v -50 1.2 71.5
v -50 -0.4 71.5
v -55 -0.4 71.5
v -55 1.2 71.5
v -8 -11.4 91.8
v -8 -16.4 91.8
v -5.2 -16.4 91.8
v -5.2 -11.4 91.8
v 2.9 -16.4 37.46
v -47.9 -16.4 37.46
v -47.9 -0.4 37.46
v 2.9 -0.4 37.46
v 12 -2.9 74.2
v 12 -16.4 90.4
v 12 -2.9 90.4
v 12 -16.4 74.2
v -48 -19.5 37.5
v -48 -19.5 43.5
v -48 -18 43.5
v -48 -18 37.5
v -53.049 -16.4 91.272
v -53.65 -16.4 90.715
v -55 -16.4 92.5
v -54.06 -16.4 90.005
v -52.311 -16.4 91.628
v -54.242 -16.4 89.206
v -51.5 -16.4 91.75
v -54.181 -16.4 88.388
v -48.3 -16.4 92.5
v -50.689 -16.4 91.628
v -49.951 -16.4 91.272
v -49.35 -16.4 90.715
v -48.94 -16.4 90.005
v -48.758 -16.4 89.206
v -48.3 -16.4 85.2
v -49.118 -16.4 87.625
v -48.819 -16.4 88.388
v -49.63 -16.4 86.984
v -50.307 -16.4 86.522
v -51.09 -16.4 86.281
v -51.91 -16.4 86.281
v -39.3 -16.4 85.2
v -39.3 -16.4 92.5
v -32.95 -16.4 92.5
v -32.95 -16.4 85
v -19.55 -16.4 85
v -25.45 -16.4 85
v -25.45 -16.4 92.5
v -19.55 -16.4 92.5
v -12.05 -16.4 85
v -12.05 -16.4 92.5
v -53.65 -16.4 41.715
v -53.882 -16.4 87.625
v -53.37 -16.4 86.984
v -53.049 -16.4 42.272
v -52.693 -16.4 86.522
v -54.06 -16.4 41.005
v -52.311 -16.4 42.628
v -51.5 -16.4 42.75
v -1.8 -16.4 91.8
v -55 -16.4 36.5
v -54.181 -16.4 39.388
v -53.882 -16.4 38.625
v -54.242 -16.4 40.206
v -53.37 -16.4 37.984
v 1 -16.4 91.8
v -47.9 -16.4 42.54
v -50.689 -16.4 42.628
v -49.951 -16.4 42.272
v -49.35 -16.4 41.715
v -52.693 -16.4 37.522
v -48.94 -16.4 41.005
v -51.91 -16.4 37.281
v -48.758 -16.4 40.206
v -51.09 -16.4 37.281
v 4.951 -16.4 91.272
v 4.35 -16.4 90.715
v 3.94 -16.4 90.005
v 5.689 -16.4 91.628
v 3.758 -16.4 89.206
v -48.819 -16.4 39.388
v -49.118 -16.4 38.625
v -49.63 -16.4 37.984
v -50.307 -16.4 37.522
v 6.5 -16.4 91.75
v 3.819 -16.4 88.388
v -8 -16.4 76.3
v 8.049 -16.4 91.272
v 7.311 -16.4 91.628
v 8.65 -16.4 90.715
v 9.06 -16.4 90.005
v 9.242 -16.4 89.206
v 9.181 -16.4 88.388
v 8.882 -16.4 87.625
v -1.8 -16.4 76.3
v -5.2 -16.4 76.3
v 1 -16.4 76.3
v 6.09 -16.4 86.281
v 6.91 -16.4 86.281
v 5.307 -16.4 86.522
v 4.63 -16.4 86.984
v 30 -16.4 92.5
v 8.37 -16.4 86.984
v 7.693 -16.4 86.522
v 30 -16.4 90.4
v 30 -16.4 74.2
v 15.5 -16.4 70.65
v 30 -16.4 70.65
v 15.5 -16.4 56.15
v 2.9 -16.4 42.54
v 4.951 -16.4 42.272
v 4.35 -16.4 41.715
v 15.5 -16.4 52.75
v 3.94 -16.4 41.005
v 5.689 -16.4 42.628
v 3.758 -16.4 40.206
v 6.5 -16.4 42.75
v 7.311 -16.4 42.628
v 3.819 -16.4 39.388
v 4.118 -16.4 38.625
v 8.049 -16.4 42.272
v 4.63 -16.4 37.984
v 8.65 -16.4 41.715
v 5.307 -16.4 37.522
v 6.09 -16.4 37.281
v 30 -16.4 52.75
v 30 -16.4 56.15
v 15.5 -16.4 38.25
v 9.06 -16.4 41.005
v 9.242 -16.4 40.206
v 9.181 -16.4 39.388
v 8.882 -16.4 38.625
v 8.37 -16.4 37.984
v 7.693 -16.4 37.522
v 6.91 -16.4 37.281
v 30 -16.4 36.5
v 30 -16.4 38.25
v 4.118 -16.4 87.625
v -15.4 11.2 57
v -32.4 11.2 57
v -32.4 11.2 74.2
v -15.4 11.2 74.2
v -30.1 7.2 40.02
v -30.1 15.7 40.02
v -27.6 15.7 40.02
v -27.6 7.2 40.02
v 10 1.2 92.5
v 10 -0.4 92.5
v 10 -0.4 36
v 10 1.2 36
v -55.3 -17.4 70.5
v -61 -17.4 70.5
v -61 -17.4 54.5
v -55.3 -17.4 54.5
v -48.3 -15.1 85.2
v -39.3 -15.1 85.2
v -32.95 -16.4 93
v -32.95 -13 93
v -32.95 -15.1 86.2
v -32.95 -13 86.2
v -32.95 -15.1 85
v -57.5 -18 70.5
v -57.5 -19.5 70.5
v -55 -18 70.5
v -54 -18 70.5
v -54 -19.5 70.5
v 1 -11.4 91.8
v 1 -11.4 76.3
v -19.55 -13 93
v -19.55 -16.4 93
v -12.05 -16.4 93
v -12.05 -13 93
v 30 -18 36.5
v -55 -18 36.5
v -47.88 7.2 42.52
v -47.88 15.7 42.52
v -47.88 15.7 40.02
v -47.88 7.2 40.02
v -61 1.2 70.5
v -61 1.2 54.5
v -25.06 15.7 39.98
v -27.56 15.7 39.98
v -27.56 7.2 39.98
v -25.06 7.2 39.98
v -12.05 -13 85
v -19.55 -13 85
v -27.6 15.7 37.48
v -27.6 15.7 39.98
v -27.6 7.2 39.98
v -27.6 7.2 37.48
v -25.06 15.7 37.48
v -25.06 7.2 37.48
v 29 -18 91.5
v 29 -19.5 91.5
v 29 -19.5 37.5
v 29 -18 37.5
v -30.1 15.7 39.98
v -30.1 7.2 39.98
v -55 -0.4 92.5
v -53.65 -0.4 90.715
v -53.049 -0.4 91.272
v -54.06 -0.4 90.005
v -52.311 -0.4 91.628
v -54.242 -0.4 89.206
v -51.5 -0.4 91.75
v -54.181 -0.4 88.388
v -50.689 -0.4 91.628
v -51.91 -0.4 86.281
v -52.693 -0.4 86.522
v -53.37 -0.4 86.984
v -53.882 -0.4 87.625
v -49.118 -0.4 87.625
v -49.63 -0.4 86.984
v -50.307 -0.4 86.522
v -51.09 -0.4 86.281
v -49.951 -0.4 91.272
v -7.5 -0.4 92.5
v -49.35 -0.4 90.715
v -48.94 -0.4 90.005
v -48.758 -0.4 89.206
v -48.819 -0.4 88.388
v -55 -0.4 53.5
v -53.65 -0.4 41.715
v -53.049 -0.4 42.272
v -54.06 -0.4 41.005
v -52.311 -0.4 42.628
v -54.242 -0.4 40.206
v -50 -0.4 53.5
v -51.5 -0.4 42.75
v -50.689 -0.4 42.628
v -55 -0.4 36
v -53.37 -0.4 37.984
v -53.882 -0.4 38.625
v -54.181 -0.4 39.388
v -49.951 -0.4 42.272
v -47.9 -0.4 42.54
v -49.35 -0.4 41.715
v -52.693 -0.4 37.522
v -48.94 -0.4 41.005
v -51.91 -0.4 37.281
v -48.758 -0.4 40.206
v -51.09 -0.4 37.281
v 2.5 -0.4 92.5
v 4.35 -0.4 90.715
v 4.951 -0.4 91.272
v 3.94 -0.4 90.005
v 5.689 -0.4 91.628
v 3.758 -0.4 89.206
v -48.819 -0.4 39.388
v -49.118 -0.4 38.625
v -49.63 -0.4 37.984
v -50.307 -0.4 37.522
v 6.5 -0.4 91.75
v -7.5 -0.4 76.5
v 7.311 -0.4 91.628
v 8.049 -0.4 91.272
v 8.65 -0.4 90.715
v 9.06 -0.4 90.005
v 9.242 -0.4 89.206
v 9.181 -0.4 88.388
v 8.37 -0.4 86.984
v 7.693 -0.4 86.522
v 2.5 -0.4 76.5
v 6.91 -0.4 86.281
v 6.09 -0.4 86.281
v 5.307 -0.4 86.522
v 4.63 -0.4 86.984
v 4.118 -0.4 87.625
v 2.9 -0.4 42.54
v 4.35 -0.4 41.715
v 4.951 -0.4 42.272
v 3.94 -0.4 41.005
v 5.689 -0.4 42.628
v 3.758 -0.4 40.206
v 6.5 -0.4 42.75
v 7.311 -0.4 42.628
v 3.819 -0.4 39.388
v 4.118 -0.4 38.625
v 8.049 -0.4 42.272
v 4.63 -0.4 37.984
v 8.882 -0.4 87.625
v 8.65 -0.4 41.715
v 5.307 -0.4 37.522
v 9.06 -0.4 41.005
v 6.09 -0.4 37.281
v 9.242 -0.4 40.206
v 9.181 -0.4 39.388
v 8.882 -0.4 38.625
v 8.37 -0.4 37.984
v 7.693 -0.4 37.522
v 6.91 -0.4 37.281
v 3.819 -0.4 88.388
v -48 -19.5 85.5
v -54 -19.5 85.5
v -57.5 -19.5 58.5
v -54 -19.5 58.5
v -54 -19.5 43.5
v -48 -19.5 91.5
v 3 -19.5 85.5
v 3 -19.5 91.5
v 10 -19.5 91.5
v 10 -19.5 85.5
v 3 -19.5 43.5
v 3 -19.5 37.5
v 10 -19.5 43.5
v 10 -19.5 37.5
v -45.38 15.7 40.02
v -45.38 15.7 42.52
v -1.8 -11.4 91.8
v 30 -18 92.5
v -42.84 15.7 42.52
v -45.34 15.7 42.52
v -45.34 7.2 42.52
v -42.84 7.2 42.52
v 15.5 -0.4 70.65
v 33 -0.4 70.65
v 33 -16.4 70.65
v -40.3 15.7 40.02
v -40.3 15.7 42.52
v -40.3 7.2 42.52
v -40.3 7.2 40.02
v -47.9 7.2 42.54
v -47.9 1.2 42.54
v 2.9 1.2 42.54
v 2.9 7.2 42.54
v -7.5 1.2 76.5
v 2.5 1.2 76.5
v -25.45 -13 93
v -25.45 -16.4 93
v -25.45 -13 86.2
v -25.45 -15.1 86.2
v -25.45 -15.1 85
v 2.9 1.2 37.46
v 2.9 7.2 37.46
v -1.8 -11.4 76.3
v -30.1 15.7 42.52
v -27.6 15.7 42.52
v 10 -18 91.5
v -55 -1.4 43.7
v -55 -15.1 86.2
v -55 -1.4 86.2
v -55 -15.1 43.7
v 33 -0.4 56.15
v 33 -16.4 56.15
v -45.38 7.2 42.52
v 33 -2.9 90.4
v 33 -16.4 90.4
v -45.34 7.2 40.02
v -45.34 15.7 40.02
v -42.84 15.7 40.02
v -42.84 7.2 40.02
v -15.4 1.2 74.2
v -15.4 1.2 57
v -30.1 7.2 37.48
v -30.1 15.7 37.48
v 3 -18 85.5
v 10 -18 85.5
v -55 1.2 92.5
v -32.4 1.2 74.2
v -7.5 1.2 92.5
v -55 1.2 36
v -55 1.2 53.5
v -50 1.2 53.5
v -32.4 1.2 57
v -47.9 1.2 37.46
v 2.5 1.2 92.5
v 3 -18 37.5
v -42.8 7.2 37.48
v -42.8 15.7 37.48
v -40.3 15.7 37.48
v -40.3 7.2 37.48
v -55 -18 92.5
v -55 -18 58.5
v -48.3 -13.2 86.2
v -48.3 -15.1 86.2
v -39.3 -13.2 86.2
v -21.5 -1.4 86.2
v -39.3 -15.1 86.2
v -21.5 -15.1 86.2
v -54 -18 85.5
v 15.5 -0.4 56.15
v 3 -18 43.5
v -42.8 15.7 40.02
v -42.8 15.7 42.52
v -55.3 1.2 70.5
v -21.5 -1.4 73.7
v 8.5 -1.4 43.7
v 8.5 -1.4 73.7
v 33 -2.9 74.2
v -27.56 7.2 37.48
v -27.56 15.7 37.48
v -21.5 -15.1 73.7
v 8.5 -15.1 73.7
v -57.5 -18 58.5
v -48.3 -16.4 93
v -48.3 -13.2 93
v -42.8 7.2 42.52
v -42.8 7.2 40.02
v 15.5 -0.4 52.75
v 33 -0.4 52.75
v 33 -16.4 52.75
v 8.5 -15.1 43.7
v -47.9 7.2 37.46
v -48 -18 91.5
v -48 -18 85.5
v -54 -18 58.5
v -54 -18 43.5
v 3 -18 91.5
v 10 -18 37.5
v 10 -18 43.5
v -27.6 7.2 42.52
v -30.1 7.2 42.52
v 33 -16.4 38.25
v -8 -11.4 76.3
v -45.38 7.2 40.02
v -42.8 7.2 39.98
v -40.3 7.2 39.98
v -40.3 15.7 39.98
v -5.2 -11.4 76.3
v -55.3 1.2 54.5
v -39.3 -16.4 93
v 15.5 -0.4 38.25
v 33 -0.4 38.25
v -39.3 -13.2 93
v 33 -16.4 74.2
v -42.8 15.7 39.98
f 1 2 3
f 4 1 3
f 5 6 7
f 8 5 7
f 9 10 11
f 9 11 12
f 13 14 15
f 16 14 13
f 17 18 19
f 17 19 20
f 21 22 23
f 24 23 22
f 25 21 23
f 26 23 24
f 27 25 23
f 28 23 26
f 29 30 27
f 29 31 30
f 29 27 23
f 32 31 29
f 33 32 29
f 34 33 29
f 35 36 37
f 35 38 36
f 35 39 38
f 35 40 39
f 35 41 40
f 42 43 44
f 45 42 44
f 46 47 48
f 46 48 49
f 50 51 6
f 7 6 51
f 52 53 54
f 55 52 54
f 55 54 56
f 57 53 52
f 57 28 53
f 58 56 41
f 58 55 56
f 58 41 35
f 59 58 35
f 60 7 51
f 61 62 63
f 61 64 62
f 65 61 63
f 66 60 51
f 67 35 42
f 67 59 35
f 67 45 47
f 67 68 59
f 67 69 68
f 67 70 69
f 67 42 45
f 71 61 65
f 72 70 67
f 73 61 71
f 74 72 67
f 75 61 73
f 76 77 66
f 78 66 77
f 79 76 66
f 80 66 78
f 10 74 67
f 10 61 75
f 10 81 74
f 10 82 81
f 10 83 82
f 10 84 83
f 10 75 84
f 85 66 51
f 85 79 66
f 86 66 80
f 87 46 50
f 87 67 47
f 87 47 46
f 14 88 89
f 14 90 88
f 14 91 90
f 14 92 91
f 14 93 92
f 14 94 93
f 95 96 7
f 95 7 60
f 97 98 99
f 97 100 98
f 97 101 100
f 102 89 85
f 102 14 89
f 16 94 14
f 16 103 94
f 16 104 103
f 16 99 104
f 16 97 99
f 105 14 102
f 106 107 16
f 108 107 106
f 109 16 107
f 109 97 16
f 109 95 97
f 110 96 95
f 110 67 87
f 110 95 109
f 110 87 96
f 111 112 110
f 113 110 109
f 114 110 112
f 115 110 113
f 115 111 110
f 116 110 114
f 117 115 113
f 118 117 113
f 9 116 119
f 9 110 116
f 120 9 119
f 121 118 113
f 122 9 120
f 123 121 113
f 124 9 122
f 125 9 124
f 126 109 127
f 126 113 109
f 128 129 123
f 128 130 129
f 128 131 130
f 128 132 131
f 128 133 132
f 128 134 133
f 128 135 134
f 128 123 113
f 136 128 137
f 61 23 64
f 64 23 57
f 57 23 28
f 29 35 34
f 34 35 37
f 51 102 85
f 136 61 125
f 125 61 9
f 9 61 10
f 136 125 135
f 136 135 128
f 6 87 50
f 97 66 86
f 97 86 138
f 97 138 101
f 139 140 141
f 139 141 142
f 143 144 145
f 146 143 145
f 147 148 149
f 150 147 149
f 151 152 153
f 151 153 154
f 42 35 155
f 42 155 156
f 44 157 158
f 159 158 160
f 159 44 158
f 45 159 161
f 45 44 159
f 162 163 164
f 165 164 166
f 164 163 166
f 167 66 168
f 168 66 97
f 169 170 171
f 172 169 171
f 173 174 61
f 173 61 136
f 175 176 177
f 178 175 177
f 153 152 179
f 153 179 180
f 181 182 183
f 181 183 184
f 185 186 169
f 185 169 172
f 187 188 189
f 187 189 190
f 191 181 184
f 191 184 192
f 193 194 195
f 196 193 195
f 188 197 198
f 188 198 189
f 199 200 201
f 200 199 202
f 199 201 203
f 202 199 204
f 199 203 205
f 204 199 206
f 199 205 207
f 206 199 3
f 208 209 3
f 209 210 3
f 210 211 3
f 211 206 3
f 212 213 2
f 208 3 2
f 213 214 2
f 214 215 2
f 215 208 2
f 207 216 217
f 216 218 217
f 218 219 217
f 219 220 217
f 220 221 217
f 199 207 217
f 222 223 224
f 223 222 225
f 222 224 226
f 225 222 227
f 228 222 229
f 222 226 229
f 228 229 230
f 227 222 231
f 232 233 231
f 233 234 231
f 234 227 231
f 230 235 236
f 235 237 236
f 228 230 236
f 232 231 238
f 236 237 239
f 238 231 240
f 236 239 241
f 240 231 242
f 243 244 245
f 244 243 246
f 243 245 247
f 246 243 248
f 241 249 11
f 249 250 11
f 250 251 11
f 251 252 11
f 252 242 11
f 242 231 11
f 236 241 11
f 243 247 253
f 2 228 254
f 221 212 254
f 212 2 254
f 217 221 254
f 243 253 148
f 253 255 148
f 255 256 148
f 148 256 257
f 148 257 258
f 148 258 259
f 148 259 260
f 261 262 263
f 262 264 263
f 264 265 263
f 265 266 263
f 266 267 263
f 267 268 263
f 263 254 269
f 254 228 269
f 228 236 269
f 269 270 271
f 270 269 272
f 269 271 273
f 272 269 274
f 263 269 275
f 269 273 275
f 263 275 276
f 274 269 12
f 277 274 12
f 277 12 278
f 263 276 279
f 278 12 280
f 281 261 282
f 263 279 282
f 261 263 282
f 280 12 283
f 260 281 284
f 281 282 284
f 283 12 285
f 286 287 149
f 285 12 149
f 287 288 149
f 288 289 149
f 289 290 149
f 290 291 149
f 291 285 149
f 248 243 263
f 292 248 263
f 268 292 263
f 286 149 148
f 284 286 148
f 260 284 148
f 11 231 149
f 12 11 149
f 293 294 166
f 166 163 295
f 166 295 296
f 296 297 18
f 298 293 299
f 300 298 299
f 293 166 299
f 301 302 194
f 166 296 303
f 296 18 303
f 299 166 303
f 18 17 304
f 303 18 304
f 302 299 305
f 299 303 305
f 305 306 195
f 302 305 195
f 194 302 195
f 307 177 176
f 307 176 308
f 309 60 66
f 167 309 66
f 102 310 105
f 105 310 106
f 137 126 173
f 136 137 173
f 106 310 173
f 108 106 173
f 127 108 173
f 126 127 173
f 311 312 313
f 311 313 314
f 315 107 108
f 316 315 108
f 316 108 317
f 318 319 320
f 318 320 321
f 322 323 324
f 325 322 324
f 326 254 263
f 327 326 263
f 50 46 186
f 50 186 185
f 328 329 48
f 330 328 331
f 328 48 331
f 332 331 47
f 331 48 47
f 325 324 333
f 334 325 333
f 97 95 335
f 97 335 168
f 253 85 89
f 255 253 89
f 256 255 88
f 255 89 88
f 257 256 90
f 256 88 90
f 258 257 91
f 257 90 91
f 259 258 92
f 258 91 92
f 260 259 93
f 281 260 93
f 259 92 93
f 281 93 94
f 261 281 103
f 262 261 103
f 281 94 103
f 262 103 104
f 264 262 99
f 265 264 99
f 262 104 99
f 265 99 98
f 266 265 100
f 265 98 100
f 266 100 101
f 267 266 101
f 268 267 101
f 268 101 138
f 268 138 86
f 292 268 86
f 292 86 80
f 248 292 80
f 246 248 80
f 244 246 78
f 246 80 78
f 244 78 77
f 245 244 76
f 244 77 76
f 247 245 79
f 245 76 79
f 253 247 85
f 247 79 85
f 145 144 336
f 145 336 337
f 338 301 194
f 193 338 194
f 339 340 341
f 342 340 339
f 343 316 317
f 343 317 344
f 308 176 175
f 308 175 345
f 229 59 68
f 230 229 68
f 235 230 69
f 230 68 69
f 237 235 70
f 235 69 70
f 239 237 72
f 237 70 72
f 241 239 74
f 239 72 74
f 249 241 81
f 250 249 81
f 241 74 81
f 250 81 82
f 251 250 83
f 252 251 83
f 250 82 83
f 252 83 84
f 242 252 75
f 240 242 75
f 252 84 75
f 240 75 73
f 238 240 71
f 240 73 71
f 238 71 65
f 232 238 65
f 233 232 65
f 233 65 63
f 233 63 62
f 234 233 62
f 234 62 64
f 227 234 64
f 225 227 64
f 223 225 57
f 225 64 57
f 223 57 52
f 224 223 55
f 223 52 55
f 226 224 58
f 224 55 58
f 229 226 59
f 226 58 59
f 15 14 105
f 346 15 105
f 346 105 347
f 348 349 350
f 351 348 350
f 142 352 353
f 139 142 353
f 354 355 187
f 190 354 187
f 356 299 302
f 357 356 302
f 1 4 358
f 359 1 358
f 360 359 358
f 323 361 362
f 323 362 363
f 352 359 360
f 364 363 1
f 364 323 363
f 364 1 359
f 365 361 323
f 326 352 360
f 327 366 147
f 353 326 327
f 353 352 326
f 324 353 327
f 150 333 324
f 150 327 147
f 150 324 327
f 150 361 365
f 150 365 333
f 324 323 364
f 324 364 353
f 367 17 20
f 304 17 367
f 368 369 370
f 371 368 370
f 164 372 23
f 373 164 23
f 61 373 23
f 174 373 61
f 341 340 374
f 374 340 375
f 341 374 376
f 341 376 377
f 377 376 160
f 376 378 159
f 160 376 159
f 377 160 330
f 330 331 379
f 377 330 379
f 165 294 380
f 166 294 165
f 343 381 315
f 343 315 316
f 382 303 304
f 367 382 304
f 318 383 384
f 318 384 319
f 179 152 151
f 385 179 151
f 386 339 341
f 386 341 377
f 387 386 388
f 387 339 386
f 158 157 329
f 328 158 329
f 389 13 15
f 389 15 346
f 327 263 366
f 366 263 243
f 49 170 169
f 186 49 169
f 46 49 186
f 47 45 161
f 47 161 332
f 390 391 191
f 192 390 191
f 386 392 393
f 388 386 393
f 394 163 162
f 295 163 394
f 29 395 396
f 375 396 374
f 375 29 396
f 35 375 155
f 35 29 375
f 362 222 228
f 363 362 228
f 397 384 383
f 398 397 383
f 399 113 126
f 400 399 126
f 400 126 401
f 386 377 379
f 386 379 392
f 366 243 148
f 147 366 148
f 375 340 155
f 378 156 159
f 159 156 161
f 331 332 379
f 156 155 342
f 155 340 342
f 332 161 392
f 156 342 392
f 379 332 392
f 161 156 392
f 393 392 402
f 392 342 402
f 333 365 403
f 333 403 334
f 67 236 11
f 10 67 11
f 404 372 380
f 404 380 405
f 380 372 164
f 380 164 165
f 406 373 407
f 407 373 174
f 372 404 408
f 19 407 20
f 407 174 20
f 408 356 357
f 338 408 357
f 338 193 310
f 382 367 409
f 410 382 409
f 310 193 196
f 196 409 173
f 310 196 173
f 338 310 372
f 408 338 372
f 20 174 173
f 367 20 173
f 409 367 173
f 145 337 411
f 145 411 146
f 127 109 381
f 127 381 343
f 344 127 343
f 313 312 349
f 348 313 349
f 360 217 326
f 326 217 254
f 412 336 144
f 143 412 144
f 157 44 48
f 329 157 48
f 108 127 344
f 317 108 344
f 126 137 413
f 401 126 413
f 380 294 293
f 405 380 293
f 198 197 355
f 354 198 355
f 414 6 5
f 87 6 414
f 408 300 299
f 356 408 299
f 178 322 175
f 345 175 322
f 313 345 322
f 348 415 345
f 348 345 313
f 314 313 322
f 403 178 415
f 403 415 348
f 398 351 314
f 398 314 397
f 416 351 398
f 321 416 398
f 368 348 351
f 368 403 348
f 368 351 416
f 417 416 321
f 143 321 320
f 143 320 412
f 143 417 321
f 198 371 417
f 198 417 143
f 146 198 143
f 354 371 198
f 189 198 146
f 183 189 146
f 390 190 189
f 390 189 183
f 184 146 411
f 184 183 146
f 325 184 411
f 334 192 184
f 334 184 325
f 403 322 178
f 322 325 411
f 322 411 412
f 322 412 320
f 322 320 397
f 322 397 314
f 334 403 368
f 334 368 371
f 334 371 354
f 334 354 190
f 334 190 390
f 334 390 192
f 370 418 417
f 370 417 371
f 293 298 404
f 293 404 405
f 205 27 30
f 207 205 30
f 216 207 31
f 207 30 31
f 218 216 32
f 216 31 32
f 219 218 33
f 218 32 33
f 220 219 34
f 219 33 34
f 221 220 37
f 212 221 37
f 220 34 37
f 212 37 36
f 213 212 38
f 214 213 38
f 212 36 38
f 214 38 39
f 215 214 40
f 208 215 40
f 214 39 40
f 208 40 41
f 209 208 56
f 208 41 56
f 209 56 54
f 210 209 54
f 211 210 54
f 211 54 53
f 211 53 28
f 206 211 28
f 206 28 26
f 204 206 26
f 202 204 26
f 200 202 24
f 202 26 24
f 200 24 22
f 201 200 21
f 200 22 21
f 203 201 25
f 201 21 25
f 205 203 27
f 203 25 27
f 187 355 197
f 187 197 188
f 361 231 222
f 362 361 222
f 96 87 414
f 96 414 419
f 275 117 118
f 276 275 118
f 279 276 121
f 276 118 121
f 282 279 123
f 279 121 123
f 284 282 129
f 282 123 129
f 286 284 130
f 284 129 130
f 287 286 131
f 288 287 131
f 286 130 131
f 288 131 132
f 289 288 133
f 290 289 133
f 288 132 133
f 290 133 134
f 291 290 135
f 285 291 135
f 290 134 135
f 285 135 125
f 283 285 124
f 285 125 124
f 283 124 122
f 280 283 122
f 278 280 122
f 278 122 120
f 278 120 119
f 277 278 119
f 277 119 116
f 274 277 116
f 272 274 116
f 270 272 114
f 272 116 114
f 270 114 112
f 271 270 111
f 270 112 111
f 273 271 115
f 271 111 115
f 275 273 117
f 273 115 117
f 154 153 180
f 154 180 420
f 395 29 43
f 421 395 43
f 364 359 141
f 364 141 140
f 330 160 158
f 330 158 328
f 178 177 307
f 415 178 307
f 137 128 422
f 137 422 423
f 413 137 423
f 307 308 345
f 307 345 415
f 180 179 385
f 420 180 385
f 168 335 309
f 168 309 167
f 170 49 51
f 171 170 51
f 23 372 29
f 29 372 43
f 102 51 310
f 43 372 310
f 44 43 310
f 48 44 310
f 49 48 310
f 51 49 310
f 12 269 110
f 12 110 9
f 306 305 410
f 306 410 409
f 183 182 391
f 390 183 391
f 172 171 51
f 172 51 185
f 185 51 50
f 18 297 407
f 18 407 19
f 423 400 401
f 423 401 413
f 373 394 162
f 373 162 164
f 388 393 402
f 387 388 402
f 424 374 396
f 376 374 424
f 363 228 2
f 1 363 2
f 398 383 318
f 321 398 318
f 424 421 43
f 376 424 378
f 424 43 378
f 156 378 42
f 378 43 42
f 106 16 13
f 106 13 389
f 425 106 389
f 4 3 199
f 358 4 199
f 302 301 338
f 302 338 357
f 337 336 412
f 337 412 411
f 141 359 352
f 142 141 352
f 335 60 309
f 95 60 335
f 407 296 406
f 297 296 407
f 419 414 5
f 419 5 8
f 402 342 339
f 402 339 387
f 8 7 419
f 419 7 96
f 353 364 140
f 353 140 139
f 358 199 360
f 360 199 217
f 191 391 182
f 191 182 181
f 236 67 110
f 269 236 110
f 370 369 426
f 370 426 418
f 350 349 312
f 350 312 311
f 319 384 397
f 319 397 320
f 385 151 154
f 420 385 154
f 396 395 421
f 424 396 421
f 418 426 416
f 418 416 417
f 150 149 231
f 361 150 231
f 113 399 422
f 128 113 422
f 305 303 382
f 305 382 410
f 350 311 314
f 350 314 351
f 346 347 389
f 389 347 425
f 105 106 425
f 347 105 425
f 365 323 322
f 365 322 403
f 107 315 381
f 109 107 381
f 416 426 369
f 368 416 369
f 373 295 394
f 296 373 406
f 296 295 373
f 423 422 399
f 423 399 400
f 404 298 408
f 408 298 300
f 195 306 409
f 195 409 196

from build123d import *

# Parameters (mm, degrees)
SKETCH1_W                                 = 85
SKETCH1_H                                 = 56
PI_5_PCB_DEPTH                            = 1.6
SKETCH2_W                                 = 51
SKETCH2_H                                 = 54
UNDERSIDE_PARTS_1_DEPTH                   = 1.5
SKETCH3_W                                 = 83
SKETCH3_H                                 = 42
UNDERSIDE_PARTS_2_DEPTH                   = 1.5
SKETCH4_W                                 = 19
SKETCH4_H                                 = 54
UNDERSIDE_PARTS_3_DEPTH                   = 1.5
SKETCH5_W                                 = 16.5
SKETCH5_H                                 = 12
MICROSD_CARD_DEPTH                        = 1.5
SKETCH6_W                                 = 33.5
SKETCH6_H                                 = 42.5
COOLER_FINS_DEPTH                         = 13.7
SKETCH7_W                                 = 30
SKETCH7_H                                 = 30
COOLER_FAN_DEPTH                          = 13.7
SKETCH8_W                                 = 50.8
SKETCH8_H                                 = 5.08
F_40_PIN_HEADER_AND_STACKING_SOCKET_DEPTH = 16
SKETCH9_R                                 = 2.75
HAT_SPACER_1_DEPTH                        = 16
SKETCH10_R                                = 2.75
HAT_SPACER_2_DEPTH                        = 16
SKETCH11_R                                = 2.75
HAT_SPACER_3_DEPTH                        = 16
SKETCH12_R                                = 2.75
HAT_SPACER_4_DEPTH                        = 16
AI_HAT_PCB_DEPTH                          = 1.6
SKETCH14_W                                = 17
SKETCH14_H                                = 17.2
HAILO_AND_HEATSINK_DEPTH                  = 10
SKETCH15_W                                = 50.8
SKETCH15_H                                = 5.08
STACKING_PINS_DEPTH                       = 6
SKETCH16_W                                = 2.5
SKETCH16_H                                = 2.5
DUPONT_HOUSINGS_DEPTH                     = 14
SKETCH17_W                                = 5.7
SKETCH17_H                                = 16
PCIE_FLAT_CABLE_LOOP_DEPTH                = 18.6
SKETCH18_W                                = 21
SKETCH18_H                                = 16.2
ETHERNET_DEPTH                            = 13.5
SKETCH19_W                                = 17.5
SKETCH19_H                                = 14.5
USB_A_STACKS_DEPTH                        = 16
SKETCH20_W                                = 9
SKETCH20_H                                = 7.8
USB_C_DEPTH                               = 3.2
SKETCH21_W                                = 7.5
SKETCH21_H                                = 8
MICRO_HDMI_DEPTH                          = 3.4
SKETCH22_W                                = 2.8
SKETCH22_H                                = 15.5
CAM_DISP_CONNECTORS_DEPTH                 = 5


with BuildPart() as part:
    # Sketch1 → Pi 5 PCB (new body)
    with BuildSketch(Plane(origin=(0, -18, 0), x_dir=(1, 0, 0), z_dir=(0, 1, 0))):
        with Locations((-12.5, -64.5)):
            Rectangle(SKETCH1_W, SKETCH1_H)
    extrude(amount=PI_5_PCB_DEPTH)

    # Sketch2 → Underside Parts 1 (add)
    with BuildSketch(Plane(origin=(0, -19.5, 0), x_dir=(1, 0, 0), z_dir=(0, 1, 0))):
        with Locations((-22.5, -64.5)):
            Rectangle(SKETCH2_W, SKETCH2_H)
    extrude(amount=UNDERSIDE_PARTS_1_DEPTH)

    # Sketch3 → Underside Parts 2 (add)
    with BuildSketch(Plane(origin=(0, -19.5, 0), x_dir=(1, 0, 0), z_dir=(0, 1, 0))):
        with Locations((-12.5, -64.5)):
            Rectangle(SKETCH3_W, SKETCH3_H)
    extrude(amount=UNDERSIDE_PARTS_2_DEPTH)

    # Sketch4 → Underside Parts 3 (add)
    with BuildSketch(Plane(origin=(0, -19.5, 0), x_dir=(1, 0, 0), z_dir=(0, 1, 0))):
        with Locations((19.5, -64.5)):
            Rectangle(SKETCH4_W, SKETCH4_H)
    extrude(amount=UNDERSIDE_PARTS_3_DEPTH)

    # Sketch5 → microSD Card (add)
    with BuildSketch(Plane(origin=(0, -19.5, 0), x_dir=(1, 0, 0), z_dir=(0, 1, 0))):
        with Locations((-49.25, -64.5)):
            Rectangle(SKETCH5_W, SKETCH5_H)
    extrude(amount=MICROSD_CARD_DEPTH)

    # Sketch8 → 40-pin Header And Stacking Socket (add)
    with BuildSketch(Plane(origin=(0, -16.4, 0), x_dir=(1, 0, 0), z_dir=(0, 1, 0))):
        with Locations((-22.5, -40)):
            Rectangle(SKETCH8_W, SKETCH8_H)
    extrude(amount=F_40_PIN_HEADER_AND_STACKING_SOCKET_DEPTH)

    # Sketch9 → HAT Spacer 1 (add)
    with BuildSketch(Plane(origin=(0, -16.4, 0), x_dir=(1, 0, 0), z_dir=(0, 1, 0))):
        with Locations(Location((-51.5, -89, 0), (0, 0, 270))):
            Circle(SKETCH9_R)
    extrude(amount=HAT_SPACER_1_DEPTH)

    # Sketch10 → HAT Spacer 2 (add)
    with BuildSketch(Plane(origin=(0, -16.4, 0), x_dir=(1, 0, 0), z_dir=(0, 1, 0))):
        with Locations(Location((6.5, -89, 0), (0, 0, 270))):
            Circle(SKETCH10_R)
    extrude(amount=HAT_SPACER_2_DEPTH)

    # Sketch11 → HAT Spacer 3 (add)
    with BuildSketch(Plane(origin=(0, -16.4, 0), x_dir=(1, 0, 0), z_dir=(0, 1, 0))):
        with Locations(Location((-51.5, -40, 0), (0, 0, 270))):
            Circle(SKETCH11_R)
    extrude(amount=HAT_SPACER_3_DEPTH)

    # Sketch12 → HAT Spacer 4 (add)
    with BuildSketch(Plane(origin=(0, -16.4, 0), x_dir=(1, 0, 0), z_dir=(0, 1, 0))):
        with Locations(Location((6.5, -40, 0), (0, 0, 270))):
            Circle(SKETCH12_R)
    extrude(amount=HAT_SPACER_4_DEPTH)

    # Sketch13 → AI HAT+ PCB (add)
    with BuildSketch(Plane(origin=(0, -0.4, 0), x_dir=(1, 0, 0), z_dir=(0, 1, 0))):
        Polygon((-55, -92.5), (-7.5, -92.5), (-7.5, -76.5), (2.5, -76.5), (2.5, -92.5), (10, -92.5), (10, -36), (-55, -36), (-55, -53.5), (-50, -53.5), (-50, -71.5), (-55, -71.5), align=None)
    extrude(amount=AI_HAT_PCB_DEPTH)

    # Sketch14 → Hailo And Heatsink (add)
    with BuildSketch(Plane(origin=(0, 1.2, 0), x_dir=(1, 0, 0), z_dir=(0, 1, 0))):
        with Locations((-23.9, -65.6)):
            Rectangle(SKETCH14_W, SKETCH14_H)
    extrude(amount=HAILO_AND_HEATSINK_DEPTH)

    # Sketch15 → Stacking Pins (add)
    with BuildSketch(Plane(origin=(0, 1.2, 0), x_dir=(1, 0, 0), z_dir=(0, 1, 0))):
        with Locations((-22.5, -40)):
            Rectangle(SKETCH15_W, SKETCH15_H)
    extrude(amount=STACKING_PINS_DEPTH)

    # Sketch16 → Dupont Housings (add)
    with BuildSketch(Plane(origin=(0, 1.7, 0), x_dir=(1, 0, 0), z_dir=(0, 1, 0))):
        with Locations((-46.63, -41.27)):
            Rectangle(SKETCH16_W, SKETCH16_H)
        with Locations((-44.09, -41.27)):
            Rectangle(SKETCH16_W, SKETCH16_H)
        with Locations((-41.55, -41.27)):
            Rectangle(SKETCH16_W, SKETCH16_H)
        with Locations((-41.55, -38.73)):
            Rectangle(SKETCH16_W, SKETCH16_H)
        with Locations((-28.85, -41.27)):
            Rectangle(SKETCH16_W, SKETCH16_H)
        with Locations((-28.85, -38.73)):
            Rectangle(SKETCH16_W, SKETCH16_H)
        with Locations((-26.31, -38.73)):
            Rectangle(SKETCH16_W, SKETCH16_H)
    extrude(amount=DUPONT_HOUSINGS_DEPTH)

    # Sketch18 → Ethernet (add)
    with BuildSketch(Plane(origin=(0, -16.4, 0), x_dir=(1, 0, 0), z_dir=(0, 1, 0))):
        with Locations((22.5, -82.3)):
            Rectangle(SKETCH18_W, SKETCH18_H)
    extrude(amount=ETHERNET_DEPTH)

    # Sketch19 → USB-A Stacks (add)
    with BuildSketch(Plane(origin=(0, -16.4, 0), x_dir=(1, 0, 0), z_dir=(0, 1, 0))):
        with Locations((24.25, -63.4)):
            Rectangle(SKETCH19_W, SKETCH19_H)
        with Locations((24.25, -45.5)):
            Rectangle(SKETCH19_W, SKETCH19_H)
    extrude(amount=USB_A_STACKS_DEPTH)



with BuildPart() as body_2:
    # Sketch6 → Cooler Fins (new body)
    with BuildSketch(Plane(origin=(0, -15.1, 0), x_dir=(1, 0, 0), z_dir=(0, 1, 0))):
        with Locations((-38.25, -64.95)):
            Rectangle(SKETCH6_W, SKETCH6_H)
    extrude(amount=COOLER_FINS_DEPTH)

    # Sketch7 → Cooler Fan (add)
    with BuildSketch(Plane(origin=(0, -15.1, 0), x_dir=(1, 0, 0), z_dir=(0, 1, 0))):
        with Locations((-6.5, -58.7)):
            Rectangle(SKETCH7_W, SKETCH7_H)
    extrude(amount=COOLER_FAN_DEPTH)


with BuildPart() as body_3:
    # Sketch17 → PCIe Flat Cable Loop (new body)
    with BuildSketch(Plane(origin=(0, -17.4, 0), x_dir=(1, 0, 0), z_dir=(0, 1, 0))):
        with Locations((-58.15, -62.5)):
            Rectangle(SKETCH17_W, SKETCH17_H)
    extrude(amount=PCIE_FLAT_CABLE_LOOP_DEPTH)


with BuildPart() as part_1:
    add(part.part)

    add(body_2.part)  # USB-C merges body 2
    # Sketch20 → USB-C (add)
    with BuildSketch(Plane(origin=(0, -16.4, 0), x_dir=(1, 0, 0), z_dir=(0, 1, 0))):
        with Locations((-43.8, -89.1)):
            Rectangle(SKETCH20_W, SKETCH20_H)
    extrude(amount=USB_C_DEPTH)

    # Sketch21 → Micro-HDMI (add)
    with BuildSketch(Plane(origin=(0, -16.4, 0), x_dir=(1, 0, 0), z_dir=(0, 1, 0))):
        with Locations((-29.2, -89)):
            Rectangle(SKETCH21_W, SKETCH21_H)
        with Locations((-15.8, -89)):
            Rectangle(SKETCH21_W, SKETCH21_H)
    extrude(amount=MICRO_HDMI_DEPTH)

    # Sketch22 → CAM-DISP Connectors (add)
    with BuildSketch(Plane(origin=(0, -16.4, 0), x_dir=(1, 0, 0), z_dir=(0, 1, 0))):
        with Locations((-6.6, -84.05)):
            Rectangle(SKETCH22_W, SKETCH22_H)
        with Locations((-0.4, -84.05)):
            Rectangle(SKETCH22_W, SKETCH22_H)
    extrude(amount=CAM_DISP_CONNECTORS_DEPTH)


solid = Compound([body_3.part, part_1.part])
